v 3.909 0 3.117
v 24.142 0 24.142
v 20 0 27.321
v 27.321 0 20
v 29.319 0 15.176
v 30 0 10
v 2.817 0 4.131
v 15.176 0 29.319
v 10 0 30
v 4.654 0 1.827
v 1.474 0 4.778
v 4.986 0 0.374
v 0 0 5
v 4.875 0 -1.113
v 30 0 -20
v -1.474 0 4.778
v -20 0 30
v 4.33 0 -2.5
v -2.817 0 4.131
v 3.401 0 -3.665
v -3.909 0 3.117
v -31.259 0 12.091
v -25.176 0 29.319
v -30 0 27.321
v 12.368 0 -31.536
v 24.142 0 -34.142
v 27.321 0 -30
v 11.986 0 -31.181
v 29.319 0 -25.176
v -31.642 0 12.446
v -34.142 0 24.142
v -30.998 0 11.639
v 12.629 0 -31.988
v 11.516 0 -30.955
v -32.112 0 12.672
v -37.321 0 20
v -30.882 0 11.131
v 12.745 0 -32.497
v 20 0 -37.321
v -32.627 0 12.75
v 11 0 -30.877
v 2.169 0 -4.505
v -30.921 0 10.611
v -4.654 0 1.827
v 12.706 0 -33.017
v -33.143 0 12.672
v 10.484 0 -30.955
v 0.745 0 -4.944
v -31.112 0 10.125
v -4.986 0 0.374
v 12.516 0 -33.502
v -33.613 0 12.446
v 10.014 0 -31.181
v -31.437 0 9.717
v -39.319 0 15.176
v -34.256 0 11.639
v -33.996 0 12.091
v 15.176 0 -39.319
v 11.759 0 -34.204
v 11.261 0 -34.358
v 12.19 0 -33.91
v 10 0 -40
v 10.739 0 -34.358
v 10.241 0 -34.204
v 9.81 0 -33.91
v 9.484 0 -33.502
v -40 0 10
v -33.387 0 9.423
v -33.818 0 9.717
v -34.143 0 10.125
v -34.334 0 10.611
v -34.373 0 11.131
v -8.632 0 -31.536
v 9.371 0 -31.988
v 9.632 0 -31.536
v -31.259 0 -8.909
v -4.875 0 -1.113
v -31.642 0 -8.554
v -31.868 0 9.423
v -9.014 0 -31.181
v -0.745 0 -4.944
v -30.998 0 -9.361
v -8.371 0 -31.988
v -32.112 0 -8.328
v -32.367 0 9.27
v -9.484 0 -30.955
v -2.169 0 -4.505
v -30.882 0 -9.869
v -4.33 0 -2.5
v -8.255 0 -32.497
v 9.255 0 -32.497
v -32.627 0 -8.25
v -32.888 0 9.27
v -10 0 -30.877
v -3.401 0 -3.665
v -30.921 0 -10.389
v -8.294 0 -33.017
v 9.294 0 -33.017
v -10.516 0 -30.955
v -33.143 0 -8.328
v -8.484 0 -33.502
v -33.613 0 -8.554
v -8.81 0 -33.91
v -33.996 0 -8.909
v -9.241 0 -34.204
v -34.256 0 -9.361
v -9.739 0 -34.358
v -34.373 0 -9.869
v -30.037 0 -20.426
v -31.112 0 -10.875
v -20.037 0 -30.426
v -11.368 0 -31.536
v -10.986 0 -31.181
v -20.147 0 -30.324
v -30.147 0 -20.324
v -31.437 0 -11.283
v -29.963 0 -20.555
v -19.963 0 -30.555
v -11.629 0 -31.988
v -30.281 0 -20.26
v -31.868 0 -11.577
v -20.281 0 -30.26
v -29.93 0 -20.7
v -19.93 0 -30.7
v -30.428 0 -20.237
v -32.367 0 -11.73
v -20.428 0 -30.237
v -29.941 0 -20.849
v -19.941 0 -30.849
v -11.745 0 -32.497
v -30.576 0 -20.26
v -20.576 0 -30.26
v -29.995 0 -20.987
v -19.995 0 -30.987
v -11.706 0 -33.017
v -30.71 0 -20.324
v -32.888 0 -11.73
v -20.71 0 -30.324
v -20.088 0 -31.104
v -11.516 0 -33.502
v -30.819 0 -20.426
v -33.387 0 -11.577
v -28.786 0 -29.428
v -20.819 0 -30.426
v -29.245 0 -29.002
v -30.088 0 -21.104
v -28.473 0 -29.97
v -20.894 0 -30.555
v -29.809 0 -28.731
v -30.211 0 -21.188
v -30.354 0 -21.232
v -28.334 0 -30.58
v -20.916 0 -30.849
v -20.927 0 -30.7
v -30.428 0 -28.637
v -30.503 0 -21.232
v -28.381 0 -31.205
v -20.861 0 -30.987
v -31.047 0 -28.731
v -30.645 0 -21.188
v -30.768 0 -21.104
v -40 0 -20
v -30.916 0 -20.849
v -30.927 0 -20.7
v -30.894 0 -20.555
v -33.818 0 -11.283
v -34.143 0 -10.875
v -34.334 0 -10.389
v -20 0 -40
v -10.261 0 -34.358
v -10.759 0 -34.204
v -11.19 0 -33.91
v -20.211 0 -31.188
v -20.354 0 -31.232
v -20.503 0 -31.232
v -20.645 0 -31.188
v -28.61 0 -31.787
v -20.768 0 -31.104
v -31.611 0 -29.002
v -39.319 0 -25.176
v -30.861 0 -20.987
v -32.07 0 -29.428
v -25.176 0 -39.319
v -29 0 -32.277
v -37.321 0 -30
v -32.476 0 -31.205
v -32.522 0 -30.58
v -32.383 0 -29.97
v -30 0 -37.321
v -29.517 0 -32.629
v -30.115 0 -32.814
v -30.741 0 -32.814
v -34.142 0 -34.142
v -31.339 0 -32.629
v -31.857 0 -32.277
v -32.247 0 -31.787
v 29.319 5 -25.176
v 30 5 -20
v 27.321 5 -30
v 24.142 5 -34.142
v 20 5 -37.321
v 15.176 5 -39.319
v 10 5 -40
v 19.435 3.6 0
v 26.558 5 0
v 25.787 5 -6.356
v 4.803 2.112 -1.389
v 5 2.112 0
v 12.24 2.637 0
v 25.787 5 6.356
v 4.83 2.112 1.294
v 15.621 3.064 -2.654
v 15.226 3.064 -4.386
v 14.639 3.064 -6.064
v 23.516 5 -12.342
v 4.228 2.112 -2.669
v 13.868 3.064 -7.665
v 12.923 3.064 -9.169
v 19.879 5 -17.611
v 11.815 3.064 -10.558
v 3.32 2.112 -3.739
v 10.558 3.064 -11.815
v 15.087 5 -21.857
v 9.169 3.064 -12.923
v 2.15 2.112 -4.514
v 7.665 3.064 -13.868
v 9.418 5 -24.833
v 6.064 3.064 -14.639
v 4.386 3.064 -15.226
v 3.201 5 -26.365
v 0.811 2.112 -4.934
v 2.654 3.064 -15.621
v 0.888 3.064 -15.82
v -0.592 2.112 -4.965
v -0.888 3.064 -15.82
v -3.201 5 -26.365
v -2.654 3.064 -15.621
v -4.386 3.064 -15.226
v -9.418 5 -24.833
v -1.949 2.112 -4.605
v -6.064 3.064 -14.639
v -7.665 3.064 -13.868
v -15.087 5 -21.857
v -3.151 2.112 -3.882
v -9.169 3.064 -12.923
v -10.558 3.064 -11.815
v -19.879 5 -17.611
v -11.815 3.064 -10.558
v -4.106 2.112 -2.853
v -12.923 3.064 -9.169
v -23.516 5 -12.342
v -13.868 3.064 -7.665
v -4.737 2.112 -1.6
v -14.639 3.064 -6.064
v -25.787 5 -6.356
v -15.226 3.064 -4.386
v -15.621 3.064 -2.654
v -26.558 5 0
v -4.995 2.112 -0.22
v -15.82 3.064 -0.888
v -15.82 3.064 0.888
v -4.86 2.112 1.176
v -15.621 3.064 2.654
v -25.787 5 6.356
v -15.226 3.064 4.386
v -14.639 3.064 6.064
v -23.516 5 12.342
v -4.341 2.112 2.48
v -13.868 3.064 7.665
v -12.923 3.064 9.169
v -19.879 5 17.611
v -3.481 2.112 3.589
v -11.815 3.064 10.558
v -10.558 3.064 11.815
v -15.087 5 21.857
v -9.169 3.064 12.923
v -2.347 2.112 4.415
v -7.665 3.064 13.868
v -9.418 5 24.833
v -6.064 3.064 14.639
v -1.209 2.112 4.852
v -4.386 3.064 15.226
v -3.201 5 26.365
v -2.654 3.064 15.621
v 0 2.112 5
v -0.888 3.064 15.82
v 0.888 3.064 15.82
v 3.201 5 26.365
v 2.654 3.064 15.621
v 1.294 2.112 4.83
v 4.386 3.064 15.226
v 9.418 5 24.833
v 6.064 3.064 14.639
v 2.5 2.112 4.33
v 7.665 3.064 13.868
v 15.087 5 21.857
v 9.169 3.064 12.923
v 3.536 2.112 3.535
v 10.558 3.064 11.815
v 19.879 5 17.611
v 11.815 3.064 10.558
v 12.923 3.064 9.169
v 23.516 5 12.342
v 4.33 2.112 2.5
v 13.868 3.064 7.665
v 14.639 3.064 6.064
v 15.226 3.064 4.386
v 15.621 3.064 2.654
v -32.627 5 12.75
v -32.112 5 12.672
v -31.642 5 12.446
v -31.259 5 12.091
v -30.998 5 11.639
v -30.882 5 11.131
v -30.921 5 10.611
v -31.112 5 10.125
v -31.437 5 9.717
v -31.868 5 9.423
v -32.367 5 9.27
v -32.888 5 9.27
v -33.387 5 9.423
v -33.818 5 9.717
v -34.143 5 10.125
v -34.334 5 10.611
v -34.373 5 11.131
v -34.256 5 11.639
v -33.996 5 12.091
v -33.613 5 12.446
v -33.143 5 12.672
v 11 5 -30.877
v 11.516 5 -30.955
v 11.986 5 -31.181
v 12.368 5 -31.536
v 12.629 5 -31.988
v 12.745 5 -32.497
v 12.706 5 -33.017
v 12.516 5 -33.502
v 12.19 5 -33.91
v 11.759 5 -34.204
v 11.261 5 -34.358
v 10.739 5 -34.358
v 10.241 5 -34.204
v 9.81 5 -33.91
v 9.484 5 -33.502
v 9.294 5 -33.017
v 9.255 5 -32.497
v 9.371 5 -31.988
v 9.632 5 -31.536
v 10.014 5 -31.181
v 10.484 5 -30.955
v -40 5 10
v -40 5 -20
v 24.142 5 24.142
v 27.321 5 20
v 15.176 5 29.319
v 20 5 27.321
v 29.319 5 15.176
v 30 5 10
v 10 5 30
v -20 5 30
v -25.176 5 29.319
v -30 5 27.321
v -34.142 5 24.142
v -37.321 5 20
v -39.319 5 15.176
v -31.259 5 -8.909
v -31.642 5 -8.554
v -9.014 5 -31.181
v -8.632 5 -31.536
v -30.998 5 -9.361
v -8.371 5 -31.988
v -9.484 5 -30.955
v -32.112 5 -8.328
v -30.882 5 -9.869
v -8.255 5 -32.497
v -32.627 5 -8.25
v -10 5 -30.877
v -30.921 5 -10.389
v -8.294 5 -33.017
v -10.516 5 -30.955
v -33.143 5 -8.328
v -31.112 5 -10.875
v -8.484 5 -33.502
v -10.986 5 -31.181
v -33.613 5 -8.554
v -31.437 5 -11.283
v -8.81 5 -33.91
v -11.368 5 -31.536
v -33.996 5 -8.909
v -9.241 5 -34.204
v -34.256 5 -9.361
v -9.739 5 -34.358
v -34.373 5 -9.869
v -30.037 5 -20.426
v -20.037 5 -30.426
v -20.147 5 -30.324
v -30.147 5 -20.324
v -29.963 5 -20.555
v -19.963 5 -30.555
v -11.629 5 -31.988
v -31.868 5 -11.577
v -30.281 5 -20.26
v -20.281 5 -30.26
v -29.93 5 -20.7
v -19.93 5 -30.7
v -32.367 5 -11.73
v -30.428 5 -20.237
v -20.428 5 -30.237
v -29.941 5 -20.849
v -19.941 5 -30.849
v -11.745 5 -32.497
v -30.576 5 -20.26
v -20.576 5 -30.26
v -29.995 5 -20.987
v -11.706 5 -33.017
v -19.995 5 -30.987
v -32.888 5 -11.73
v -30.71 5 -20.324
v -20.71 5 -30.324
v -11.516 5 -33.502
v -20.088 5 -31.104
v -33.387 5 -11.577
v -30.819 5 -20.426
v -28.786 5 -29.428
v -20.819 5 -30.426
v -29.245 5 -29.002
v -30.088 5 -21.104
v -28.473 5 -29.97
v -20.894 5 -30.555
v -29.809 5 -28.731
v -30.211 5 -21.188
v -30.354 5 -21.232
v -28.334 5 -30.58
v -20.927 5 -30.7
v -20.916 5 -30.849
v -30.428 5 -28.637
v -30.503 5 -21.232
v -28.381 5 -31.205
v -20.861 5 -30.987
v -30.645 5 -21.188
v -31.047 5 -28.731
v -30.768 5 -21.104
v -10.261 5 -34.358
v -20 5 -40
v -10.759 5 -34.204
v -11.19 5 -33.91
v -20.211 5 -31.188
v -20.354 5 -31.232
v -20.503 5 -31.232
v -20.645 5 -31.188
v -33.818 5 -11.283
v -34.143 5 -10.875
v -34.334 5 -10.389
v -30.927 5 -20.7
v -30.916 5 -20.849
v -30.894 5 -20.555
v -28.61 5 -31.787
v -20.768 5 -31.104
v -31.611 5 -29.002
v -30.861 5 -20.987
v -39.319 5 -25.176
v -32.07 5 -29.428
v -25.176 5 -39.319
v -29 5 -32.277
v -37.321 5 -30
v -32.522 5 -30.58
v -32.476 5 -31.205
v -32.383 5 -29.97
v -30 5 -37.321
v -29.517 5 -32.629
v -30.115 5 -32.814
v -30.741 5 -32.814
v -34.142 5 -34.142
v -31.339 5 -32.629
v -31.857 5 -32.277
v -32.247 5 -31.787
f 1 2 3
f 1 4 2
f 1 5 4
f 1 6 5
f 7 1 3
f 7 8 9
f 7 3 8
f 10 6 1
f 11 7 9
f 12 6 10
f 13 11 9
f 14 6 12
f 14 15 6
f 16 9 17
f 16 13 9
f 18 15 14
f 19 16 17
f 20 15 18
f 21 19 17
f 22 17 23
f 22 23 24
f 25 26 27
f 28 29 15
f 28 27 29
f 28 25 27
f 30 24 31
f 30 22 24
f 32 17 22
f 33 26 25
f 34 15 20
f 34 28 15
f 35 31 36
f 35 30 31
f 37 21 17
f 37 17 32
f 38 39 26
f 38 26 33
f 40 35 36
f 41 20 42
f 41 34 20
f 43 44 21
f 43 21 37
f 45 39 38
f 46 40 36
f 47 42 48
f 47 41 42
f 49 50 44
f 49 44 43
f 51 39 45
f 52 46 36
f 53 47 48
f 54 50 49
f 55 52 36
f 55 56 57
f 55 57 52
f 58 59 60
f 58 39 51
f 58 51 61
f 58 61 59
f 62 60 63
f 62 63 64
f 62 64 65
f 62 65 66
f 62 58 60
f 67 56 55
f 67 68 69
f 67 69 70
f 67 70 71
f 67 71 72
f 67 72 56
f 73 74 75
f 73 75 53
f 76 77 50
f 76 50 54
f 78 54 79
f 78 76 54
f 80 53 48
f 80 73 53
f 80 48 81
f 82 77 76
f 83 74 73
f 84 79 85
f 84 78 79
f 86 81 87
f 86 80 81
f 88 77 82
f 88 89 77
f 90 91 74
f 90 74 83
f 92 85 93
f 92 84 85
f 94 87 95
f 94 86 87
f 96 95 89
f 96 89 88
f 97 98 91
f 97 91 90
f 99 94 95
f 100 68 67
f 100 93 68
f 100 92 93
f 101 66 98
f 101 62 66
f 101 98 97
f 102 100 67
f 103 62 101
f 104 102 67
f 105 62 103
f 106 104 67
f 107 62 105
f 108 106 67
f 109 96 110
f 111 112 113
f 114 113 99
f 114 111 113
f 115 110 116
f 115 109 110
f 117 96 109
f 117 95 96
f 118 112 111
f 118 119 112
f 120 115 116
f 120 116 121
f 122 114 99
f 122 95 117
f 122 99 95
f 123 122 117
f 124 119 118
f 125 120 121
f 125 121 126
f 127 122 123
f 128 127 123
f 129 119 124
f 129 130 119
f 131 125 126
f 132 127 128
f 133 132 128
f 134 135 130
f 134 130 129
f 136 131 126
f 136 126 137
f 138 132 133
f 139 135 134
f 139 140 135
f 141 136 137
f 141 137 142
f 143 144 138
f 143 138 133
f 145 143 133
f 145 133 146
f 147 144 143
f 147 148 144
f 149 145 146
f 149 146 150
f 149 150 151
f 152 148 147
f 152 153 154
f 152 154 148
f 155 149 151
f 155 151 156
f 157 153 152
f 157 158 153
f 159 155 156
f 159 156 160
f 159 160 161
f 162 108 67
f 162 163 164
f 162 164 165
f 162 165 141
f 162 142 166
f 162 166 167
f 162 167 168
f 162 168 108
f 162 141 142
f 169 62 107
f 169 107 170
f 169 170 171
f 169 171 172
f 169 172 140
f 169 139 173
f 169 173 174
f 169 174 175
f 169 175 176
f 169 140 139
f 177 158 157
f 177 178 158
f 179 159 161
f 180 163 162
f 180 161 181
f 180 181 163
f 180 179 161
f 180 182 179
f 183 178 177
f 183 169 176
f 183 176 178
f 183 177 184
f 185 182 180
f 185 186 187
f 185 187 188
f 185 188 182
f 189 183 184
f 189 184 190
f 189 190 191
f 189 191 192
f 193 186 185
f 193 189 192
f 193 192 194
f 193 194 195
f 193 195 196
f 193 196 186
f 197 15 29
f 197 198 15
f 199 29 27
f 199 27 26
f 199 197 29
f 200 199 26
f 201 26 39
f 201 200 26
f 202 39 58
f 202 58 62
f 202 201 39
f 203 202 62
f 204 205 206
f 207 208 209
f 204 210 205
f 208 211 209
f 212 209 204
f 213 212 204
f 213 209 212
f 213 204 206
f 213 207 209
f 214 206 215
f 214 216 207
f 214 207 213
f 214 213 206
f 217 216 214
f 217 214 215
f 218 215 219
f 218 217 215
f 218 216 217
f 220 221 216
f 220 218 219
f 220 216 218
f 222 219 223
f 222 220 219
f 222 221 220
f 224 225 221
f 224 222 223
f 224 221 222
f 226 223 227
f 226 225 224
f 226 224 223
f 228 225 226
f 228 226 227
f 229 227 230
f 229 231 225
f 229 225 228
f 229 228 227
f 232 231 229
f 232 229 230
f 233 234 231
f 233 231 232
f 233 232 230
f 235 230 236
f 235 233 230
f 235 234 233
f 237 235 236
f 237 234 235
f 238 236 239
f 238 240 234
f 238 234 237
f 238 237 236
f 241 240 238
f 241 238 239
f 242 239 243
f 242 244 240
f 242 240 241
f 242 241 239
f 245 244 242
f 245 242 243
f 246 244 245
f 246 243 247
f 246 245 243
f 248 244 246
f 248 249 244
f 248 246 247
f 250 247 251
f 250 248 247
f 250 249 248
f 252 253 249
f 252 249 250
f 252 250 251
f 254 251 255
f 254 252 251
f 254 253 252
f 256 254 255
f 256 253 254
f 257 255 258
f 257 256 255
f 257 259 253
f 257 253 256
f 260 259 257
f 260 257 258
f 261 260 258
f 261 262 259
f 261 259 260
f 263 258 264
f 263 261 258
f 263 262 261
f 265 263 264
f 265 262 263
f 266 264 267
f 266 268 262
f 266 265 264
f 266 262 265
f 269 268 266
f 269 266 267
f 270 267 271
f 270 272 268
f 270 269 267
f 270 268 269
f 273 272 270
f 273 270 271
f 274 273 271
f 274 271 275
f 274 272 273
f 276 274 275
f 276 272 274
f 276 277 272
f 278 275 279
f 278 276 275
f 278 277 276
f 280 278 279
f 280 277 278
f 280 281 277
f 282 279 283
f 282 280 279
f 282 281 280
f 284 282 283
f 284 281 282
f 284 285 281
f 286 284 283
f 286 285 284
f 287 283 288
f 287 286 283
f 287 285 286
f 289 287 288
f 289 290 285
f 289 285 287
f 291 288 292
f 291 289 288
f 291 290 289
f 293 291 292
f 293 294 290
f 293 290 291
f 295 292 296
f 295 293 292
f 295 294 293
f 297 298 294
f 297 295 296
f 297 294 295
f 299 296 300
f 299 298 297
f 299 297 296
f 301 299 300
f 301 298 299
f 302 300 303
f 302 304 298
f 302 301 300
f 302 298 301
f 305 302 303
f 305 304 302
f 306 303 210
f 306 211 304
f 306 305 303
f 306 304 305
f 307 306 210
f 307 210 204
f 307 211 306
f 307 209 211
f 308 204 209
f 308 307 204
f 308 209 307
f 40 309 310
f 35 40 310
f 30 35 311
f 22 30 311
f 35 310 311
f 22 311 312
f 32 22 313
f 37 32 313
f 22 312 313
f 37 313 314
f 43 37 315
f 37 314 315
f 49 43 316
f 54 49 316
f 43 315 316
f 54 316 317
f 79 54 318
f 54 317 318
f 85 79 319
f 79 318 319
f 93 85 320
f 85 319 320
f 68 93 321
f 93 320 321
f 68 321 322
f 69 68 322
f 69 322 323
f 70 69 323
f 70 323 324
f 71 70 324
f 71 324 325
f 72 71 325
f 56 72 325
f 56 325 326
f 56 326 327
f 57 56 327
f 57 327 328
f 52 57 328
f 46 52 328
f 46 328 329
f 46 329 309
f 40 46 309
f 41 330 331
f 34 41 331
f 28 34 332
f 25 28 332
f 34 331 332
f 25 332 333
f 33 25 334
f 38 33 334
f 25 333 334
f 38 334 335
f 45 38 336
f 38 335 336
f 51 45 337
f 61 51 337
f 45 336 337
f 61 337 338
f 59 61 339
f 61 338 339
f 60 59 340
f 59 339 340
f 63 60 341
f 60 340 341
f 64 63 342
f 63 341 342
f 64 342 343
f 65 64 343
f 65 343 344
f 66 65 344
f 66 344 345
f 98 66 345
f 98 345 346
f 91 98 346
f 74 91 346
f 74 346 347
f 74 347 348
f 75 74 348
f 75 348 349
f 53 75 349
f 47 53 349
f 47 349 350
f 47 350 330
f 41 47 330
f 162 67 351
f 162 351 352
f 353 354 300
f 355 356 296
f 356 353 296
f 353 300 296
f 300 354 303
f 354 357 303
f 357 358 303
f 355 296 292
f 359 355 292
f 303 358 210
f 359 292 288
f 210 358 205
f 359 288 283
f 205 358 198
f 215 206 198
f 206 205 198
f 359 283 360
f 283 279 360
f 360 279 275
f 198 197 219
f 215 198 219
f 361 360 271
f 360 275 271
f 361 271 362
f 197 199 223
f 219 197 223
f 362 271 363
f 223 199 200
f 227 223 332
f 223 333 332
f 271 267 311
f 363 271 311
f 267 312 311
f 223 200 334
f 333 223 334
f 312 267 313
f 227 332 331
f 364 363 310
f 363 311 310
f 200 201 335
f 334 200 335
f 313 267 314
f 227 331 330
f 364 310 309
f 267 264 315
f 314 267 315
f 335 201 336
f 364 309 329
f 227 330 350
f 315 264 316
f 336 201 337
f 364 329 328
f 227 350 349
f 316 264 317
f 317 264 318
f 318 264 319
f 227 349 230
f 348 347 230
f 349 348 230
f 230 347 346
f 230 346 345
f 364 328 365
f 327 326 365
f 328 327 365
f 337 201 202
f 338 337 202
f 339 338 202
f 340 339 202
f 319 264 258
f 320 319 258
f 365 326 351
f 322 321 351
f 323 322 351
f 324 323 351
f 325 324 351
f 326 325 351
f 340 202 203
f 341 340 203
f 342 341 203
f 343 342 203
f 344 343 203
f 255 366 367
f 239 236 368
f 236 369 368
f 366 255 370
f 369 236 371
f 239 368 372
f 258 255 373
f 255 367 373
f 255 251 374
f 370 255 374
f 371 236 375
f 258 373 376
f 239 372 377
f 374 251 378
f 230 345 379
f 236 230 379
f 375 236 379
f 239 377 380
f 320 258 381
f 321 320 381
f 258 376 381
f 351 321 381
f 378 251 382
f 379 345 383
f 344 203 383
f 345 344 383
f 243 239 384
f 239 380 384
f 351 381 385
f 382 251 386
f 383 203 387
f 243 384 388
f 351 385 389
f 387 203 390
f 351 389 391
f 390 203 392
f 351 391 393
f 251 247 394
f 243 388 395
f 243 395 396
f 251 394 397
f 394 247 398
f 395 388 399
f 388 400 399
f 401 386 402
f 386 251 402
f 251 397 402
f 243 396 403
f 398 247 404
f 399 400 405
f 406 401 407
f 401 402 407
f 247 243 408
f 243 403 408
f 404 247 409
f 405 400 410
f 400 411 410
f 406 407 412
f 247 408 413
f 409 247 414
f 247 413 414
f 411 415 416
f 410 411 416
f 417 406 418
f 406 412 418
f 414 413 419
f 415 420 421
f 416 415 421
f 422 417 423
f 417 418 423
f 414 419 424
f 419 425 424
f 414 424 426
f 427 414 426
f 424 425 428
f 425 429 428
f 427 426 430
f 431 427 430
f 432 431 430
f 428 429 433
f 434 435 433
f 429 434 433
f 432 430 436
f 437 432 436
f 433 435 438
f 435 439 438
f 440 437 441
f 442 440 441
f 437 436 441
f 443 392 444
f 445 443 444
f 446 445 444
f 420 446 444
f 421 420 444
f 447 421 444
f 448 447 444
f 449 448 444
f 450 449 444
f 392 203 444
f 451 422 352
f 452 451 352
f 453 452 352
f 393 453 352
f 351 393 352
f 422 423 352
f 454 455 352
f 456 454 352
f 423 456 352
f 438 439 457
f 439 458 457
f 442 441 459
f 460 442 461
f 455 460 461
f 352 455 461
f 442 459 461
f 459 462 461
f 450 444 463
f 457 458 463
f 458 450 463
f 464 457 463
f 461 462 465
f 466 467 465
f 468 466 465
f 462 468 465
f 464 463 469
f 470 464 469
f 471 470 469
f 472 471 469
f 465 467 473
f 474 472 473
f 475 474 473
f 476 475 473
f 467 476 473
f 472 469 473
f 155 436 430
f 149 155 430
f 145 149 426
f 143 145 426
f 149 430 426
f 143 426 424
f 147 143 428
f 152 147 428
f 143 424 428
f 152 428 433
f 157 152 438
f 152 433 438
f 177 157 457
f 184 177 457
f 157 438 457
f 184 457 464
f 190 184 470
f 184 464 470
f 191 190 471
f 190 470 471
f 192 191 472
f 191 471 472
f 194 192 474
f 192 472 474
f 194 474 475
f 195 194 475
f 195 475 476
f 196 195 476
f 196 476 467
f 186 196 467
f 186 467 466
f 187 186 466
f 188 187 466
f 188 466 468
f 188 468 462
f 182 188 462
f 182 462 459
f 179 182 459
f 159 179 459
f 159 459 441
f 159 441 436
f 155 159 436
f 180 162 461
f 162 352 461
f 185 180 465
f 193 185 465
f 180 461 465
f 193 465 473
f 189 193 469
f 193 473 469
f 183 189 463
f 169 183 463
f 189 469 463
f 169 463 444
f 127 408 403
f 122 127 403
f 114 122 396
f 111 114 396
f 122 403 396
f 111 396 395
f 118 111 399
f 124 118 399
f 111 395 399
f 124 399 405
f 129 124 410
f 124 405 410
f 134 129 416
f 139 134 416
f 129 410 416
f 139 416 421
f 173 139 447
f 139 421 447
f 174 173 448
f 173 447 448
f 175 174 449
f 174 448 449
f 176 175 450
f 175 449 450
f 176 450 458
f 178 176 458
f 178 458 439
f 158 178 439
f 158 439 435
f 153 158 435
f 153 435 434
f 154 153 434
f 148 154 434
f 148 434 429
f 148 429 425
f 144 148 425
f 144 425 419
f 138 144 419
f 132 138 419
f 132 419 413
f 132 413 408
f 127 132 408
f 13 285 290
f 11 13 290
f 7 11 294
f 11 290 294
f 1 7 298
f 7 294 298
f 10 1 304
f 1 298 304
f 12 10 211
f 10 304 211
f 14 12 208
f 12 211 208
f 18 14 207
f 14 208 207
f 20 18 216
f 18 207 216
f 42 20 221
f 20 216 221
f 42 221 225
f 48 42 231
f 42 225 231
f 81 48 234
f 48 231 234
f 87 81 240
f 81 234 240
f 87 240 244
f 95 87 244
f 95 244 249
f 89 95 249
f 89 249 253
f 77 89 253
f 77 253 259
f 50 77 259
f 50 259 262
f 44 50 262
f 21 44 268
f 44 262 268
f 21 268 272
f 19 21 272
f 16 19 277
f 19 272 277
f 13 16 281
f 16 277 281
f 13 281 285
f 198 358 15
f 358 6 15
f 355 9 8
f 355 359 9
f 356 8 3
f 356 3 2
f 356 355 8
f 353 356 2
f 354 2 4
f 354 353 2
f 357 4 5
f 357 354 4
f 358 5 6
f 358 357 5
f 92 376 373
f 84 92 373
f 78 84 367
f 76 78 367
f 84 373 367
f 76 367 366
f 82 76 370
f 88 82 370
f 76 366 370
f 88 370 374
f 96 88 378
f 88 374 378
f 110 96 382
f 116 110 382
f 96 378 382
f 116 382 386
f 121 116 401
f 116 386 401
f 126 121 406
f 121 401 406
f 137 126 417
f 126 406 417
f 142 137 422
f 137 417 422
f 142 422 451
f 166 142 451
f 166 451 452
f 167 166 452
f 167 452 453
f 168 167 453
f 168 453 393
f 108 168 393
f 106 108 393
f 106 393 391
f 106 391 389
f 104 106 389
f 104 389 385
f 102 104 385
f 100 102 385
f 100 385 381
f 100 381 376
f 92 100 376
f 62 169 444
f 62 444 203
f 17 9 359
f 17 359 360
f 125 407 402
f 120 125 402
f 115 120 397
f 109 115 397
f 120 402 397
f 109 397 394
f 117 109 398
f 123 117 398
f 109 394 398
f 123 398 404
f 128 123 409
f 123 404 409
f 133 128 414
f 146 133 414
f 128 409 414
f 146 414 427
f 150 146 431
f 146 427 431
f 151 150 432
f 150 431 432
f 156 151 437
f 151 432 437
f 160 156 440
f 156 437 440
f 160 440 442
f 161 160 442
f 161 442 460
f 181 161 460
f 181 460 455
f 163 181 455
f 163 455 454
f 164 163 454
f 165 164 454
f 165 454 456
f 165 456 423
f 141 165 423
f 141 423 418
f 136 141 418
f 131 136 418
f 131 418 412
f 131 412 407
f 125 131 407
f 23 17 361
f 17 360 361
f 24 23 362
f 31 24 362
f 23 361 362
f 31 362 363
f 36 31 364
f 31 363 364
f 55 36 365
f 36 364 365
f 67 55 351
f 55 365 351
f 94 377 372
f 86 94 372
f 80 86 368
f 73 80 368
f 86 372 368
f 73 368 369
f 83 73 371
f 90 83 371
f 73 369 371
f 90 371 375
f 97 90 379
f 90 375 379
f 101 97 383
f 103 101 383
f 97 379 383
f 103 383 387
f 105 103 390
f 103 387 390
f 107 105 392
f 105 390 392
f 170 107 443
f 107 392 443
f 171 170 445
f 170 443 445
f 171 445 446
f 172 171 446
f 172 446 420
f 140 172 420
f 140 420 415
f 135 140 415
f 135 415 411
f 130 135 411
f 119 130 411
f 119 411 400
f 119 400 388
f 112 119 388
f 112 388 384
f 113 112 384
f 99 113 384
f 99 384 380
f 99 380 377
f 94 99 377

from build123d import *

# Parameters (mm, degrees)
SKETCH1_W           = 60
SKETCH1_H           = 60
BOSS_EXTRUDE1_DEPTH = 5
SKETCH2_R           = 5
CUT_EXTRUDE1_DEPTH  = 43.720018727
BOSS_EXTRUDE2_DEPTH = 5
SKETCH4_R           = 1.75
CUT_EXTRUDE2_DEPTH  = 57.789083467
FILLET1_R           = 20
SKETCH8_R           = 2.1
SKETCH8_R_2         = 0.5
CUT_EXTRUDE3_DEPTH  = 10


with BuildPart() as part:
    # Sketch1 → Boss-Extrude1 (new body)
    with BuildSketch(Plane(origin=(0, 0, 0), x_dir=(1, 0, 0), z_dir=(0, 1, 0))):
        Rectangle(SKETCH1_W, SKETCH1_H)
    extrude(amount=BOSS_EXTRUDE1_DEPTH)

    # Sketch2 → Cut-Extrude1 (cut, through all)
    with BuildSketch(Plane(origin=(0, 5, 0), x_dir=(1, 0, 0), z_dir=(0, 1, 0))):
        with Locations(Location((0, 0, 0), (0, 0, 270))):
            Circle(SKETCH2_R)
    extrude(amount=-CUT_EXTRUDE1_DEPTH, mode=Mode.SUBTRACT)

    # Sketch3 → Cut-Revolve1 (revolve, cut)
    with BuildSketch(Plane.XY):
        with BuildLine():
            Line((0, 2.007275927), (0, 240.687318419))
            ThreePointArc((0, 240.687318419), (119.340021246, 121.347297173), (0, 2.007275927))
        make_face()
    revolve(axis=Axis((0, 2.007275927, 0), (0, 1, 0)), mode=Mode.SUBTRACT)

    # Sketch5 → Boss-Extrude2 (add)
    with BuildSketch(Plane(origin=(0, 0, 0), x_dir=(1, 0, 0), z_dir=(0, 1, 0))):
        Polygon((-30, -30), (-40, -30), (-40, 40), (30, 40), (30, 30), (-30, 30), align=None)
    extrude(amount=BOSS_EXTRUDE2_DEPTH)

    # Sketch4 → Cut-Extrude2 (cut, through all)
    with BuildSketch(Plane(origin=(0, 5, 0), x_dir=(1, 0, 0), z_dir=(0, 1, 0))):
        with Locations(Location((-32.627416998, 10, 0), (0, 0, 270))):
            Circle(SKETCH4_R)
        with Locations(Location((-10, 32.627416998, 0), (0, 0, 270))):
            Circle(SKETCH4_R)
        with Locations(Location((11, 32.627416998, 0), (0, 0, 270))):
            Circle(SKETCH4_R)
        with Locations(Location((-32.627416998, -11, 0), (0, 0, 270))):
            Circle(SKETCH4_R)
    extrude(amount=-CUT_EXTRUDE2_DEPTH, mode=Mode.SUBTRACT)

    # Fillet1
    fillet1_edges = [part.edges().sort_by_distance(p)[0] for p in [
        (30, 2.5, -40),
        (-40, 2.5, -40),
        (-40, 2.5, 30),
        (30, 2.5, 30),
    ]]
    fillet(fillet1_edges, radius=FILLET1_R)

    # Sketch8 → Cut-Extrude3 (cut)
    with BuildSketch(Plane(origin=(0, 5, 0), x_dir=(1, 0, 0), z_dir=(0, 1, 0))):
        with Locations(Location((-30.428243041, 30.737374818, 0), (0, 0, 270))):
            Circle(SKETCH8_R)
        with Locations(Location((-20.428243041, 30.737374818, 0), (0, 0, 270))):
            Circle(SKETCH8_R_2)
        with Locations(Location((-30.428243041, 20.737374818, 0), (0, 0, 270))):
            Circle(SKETCH8_R_2)
    extrude(amount=-CUT_EXTRUDE3_DEPTH, mode=Mode.SUBTRACT)


solid = part.part
